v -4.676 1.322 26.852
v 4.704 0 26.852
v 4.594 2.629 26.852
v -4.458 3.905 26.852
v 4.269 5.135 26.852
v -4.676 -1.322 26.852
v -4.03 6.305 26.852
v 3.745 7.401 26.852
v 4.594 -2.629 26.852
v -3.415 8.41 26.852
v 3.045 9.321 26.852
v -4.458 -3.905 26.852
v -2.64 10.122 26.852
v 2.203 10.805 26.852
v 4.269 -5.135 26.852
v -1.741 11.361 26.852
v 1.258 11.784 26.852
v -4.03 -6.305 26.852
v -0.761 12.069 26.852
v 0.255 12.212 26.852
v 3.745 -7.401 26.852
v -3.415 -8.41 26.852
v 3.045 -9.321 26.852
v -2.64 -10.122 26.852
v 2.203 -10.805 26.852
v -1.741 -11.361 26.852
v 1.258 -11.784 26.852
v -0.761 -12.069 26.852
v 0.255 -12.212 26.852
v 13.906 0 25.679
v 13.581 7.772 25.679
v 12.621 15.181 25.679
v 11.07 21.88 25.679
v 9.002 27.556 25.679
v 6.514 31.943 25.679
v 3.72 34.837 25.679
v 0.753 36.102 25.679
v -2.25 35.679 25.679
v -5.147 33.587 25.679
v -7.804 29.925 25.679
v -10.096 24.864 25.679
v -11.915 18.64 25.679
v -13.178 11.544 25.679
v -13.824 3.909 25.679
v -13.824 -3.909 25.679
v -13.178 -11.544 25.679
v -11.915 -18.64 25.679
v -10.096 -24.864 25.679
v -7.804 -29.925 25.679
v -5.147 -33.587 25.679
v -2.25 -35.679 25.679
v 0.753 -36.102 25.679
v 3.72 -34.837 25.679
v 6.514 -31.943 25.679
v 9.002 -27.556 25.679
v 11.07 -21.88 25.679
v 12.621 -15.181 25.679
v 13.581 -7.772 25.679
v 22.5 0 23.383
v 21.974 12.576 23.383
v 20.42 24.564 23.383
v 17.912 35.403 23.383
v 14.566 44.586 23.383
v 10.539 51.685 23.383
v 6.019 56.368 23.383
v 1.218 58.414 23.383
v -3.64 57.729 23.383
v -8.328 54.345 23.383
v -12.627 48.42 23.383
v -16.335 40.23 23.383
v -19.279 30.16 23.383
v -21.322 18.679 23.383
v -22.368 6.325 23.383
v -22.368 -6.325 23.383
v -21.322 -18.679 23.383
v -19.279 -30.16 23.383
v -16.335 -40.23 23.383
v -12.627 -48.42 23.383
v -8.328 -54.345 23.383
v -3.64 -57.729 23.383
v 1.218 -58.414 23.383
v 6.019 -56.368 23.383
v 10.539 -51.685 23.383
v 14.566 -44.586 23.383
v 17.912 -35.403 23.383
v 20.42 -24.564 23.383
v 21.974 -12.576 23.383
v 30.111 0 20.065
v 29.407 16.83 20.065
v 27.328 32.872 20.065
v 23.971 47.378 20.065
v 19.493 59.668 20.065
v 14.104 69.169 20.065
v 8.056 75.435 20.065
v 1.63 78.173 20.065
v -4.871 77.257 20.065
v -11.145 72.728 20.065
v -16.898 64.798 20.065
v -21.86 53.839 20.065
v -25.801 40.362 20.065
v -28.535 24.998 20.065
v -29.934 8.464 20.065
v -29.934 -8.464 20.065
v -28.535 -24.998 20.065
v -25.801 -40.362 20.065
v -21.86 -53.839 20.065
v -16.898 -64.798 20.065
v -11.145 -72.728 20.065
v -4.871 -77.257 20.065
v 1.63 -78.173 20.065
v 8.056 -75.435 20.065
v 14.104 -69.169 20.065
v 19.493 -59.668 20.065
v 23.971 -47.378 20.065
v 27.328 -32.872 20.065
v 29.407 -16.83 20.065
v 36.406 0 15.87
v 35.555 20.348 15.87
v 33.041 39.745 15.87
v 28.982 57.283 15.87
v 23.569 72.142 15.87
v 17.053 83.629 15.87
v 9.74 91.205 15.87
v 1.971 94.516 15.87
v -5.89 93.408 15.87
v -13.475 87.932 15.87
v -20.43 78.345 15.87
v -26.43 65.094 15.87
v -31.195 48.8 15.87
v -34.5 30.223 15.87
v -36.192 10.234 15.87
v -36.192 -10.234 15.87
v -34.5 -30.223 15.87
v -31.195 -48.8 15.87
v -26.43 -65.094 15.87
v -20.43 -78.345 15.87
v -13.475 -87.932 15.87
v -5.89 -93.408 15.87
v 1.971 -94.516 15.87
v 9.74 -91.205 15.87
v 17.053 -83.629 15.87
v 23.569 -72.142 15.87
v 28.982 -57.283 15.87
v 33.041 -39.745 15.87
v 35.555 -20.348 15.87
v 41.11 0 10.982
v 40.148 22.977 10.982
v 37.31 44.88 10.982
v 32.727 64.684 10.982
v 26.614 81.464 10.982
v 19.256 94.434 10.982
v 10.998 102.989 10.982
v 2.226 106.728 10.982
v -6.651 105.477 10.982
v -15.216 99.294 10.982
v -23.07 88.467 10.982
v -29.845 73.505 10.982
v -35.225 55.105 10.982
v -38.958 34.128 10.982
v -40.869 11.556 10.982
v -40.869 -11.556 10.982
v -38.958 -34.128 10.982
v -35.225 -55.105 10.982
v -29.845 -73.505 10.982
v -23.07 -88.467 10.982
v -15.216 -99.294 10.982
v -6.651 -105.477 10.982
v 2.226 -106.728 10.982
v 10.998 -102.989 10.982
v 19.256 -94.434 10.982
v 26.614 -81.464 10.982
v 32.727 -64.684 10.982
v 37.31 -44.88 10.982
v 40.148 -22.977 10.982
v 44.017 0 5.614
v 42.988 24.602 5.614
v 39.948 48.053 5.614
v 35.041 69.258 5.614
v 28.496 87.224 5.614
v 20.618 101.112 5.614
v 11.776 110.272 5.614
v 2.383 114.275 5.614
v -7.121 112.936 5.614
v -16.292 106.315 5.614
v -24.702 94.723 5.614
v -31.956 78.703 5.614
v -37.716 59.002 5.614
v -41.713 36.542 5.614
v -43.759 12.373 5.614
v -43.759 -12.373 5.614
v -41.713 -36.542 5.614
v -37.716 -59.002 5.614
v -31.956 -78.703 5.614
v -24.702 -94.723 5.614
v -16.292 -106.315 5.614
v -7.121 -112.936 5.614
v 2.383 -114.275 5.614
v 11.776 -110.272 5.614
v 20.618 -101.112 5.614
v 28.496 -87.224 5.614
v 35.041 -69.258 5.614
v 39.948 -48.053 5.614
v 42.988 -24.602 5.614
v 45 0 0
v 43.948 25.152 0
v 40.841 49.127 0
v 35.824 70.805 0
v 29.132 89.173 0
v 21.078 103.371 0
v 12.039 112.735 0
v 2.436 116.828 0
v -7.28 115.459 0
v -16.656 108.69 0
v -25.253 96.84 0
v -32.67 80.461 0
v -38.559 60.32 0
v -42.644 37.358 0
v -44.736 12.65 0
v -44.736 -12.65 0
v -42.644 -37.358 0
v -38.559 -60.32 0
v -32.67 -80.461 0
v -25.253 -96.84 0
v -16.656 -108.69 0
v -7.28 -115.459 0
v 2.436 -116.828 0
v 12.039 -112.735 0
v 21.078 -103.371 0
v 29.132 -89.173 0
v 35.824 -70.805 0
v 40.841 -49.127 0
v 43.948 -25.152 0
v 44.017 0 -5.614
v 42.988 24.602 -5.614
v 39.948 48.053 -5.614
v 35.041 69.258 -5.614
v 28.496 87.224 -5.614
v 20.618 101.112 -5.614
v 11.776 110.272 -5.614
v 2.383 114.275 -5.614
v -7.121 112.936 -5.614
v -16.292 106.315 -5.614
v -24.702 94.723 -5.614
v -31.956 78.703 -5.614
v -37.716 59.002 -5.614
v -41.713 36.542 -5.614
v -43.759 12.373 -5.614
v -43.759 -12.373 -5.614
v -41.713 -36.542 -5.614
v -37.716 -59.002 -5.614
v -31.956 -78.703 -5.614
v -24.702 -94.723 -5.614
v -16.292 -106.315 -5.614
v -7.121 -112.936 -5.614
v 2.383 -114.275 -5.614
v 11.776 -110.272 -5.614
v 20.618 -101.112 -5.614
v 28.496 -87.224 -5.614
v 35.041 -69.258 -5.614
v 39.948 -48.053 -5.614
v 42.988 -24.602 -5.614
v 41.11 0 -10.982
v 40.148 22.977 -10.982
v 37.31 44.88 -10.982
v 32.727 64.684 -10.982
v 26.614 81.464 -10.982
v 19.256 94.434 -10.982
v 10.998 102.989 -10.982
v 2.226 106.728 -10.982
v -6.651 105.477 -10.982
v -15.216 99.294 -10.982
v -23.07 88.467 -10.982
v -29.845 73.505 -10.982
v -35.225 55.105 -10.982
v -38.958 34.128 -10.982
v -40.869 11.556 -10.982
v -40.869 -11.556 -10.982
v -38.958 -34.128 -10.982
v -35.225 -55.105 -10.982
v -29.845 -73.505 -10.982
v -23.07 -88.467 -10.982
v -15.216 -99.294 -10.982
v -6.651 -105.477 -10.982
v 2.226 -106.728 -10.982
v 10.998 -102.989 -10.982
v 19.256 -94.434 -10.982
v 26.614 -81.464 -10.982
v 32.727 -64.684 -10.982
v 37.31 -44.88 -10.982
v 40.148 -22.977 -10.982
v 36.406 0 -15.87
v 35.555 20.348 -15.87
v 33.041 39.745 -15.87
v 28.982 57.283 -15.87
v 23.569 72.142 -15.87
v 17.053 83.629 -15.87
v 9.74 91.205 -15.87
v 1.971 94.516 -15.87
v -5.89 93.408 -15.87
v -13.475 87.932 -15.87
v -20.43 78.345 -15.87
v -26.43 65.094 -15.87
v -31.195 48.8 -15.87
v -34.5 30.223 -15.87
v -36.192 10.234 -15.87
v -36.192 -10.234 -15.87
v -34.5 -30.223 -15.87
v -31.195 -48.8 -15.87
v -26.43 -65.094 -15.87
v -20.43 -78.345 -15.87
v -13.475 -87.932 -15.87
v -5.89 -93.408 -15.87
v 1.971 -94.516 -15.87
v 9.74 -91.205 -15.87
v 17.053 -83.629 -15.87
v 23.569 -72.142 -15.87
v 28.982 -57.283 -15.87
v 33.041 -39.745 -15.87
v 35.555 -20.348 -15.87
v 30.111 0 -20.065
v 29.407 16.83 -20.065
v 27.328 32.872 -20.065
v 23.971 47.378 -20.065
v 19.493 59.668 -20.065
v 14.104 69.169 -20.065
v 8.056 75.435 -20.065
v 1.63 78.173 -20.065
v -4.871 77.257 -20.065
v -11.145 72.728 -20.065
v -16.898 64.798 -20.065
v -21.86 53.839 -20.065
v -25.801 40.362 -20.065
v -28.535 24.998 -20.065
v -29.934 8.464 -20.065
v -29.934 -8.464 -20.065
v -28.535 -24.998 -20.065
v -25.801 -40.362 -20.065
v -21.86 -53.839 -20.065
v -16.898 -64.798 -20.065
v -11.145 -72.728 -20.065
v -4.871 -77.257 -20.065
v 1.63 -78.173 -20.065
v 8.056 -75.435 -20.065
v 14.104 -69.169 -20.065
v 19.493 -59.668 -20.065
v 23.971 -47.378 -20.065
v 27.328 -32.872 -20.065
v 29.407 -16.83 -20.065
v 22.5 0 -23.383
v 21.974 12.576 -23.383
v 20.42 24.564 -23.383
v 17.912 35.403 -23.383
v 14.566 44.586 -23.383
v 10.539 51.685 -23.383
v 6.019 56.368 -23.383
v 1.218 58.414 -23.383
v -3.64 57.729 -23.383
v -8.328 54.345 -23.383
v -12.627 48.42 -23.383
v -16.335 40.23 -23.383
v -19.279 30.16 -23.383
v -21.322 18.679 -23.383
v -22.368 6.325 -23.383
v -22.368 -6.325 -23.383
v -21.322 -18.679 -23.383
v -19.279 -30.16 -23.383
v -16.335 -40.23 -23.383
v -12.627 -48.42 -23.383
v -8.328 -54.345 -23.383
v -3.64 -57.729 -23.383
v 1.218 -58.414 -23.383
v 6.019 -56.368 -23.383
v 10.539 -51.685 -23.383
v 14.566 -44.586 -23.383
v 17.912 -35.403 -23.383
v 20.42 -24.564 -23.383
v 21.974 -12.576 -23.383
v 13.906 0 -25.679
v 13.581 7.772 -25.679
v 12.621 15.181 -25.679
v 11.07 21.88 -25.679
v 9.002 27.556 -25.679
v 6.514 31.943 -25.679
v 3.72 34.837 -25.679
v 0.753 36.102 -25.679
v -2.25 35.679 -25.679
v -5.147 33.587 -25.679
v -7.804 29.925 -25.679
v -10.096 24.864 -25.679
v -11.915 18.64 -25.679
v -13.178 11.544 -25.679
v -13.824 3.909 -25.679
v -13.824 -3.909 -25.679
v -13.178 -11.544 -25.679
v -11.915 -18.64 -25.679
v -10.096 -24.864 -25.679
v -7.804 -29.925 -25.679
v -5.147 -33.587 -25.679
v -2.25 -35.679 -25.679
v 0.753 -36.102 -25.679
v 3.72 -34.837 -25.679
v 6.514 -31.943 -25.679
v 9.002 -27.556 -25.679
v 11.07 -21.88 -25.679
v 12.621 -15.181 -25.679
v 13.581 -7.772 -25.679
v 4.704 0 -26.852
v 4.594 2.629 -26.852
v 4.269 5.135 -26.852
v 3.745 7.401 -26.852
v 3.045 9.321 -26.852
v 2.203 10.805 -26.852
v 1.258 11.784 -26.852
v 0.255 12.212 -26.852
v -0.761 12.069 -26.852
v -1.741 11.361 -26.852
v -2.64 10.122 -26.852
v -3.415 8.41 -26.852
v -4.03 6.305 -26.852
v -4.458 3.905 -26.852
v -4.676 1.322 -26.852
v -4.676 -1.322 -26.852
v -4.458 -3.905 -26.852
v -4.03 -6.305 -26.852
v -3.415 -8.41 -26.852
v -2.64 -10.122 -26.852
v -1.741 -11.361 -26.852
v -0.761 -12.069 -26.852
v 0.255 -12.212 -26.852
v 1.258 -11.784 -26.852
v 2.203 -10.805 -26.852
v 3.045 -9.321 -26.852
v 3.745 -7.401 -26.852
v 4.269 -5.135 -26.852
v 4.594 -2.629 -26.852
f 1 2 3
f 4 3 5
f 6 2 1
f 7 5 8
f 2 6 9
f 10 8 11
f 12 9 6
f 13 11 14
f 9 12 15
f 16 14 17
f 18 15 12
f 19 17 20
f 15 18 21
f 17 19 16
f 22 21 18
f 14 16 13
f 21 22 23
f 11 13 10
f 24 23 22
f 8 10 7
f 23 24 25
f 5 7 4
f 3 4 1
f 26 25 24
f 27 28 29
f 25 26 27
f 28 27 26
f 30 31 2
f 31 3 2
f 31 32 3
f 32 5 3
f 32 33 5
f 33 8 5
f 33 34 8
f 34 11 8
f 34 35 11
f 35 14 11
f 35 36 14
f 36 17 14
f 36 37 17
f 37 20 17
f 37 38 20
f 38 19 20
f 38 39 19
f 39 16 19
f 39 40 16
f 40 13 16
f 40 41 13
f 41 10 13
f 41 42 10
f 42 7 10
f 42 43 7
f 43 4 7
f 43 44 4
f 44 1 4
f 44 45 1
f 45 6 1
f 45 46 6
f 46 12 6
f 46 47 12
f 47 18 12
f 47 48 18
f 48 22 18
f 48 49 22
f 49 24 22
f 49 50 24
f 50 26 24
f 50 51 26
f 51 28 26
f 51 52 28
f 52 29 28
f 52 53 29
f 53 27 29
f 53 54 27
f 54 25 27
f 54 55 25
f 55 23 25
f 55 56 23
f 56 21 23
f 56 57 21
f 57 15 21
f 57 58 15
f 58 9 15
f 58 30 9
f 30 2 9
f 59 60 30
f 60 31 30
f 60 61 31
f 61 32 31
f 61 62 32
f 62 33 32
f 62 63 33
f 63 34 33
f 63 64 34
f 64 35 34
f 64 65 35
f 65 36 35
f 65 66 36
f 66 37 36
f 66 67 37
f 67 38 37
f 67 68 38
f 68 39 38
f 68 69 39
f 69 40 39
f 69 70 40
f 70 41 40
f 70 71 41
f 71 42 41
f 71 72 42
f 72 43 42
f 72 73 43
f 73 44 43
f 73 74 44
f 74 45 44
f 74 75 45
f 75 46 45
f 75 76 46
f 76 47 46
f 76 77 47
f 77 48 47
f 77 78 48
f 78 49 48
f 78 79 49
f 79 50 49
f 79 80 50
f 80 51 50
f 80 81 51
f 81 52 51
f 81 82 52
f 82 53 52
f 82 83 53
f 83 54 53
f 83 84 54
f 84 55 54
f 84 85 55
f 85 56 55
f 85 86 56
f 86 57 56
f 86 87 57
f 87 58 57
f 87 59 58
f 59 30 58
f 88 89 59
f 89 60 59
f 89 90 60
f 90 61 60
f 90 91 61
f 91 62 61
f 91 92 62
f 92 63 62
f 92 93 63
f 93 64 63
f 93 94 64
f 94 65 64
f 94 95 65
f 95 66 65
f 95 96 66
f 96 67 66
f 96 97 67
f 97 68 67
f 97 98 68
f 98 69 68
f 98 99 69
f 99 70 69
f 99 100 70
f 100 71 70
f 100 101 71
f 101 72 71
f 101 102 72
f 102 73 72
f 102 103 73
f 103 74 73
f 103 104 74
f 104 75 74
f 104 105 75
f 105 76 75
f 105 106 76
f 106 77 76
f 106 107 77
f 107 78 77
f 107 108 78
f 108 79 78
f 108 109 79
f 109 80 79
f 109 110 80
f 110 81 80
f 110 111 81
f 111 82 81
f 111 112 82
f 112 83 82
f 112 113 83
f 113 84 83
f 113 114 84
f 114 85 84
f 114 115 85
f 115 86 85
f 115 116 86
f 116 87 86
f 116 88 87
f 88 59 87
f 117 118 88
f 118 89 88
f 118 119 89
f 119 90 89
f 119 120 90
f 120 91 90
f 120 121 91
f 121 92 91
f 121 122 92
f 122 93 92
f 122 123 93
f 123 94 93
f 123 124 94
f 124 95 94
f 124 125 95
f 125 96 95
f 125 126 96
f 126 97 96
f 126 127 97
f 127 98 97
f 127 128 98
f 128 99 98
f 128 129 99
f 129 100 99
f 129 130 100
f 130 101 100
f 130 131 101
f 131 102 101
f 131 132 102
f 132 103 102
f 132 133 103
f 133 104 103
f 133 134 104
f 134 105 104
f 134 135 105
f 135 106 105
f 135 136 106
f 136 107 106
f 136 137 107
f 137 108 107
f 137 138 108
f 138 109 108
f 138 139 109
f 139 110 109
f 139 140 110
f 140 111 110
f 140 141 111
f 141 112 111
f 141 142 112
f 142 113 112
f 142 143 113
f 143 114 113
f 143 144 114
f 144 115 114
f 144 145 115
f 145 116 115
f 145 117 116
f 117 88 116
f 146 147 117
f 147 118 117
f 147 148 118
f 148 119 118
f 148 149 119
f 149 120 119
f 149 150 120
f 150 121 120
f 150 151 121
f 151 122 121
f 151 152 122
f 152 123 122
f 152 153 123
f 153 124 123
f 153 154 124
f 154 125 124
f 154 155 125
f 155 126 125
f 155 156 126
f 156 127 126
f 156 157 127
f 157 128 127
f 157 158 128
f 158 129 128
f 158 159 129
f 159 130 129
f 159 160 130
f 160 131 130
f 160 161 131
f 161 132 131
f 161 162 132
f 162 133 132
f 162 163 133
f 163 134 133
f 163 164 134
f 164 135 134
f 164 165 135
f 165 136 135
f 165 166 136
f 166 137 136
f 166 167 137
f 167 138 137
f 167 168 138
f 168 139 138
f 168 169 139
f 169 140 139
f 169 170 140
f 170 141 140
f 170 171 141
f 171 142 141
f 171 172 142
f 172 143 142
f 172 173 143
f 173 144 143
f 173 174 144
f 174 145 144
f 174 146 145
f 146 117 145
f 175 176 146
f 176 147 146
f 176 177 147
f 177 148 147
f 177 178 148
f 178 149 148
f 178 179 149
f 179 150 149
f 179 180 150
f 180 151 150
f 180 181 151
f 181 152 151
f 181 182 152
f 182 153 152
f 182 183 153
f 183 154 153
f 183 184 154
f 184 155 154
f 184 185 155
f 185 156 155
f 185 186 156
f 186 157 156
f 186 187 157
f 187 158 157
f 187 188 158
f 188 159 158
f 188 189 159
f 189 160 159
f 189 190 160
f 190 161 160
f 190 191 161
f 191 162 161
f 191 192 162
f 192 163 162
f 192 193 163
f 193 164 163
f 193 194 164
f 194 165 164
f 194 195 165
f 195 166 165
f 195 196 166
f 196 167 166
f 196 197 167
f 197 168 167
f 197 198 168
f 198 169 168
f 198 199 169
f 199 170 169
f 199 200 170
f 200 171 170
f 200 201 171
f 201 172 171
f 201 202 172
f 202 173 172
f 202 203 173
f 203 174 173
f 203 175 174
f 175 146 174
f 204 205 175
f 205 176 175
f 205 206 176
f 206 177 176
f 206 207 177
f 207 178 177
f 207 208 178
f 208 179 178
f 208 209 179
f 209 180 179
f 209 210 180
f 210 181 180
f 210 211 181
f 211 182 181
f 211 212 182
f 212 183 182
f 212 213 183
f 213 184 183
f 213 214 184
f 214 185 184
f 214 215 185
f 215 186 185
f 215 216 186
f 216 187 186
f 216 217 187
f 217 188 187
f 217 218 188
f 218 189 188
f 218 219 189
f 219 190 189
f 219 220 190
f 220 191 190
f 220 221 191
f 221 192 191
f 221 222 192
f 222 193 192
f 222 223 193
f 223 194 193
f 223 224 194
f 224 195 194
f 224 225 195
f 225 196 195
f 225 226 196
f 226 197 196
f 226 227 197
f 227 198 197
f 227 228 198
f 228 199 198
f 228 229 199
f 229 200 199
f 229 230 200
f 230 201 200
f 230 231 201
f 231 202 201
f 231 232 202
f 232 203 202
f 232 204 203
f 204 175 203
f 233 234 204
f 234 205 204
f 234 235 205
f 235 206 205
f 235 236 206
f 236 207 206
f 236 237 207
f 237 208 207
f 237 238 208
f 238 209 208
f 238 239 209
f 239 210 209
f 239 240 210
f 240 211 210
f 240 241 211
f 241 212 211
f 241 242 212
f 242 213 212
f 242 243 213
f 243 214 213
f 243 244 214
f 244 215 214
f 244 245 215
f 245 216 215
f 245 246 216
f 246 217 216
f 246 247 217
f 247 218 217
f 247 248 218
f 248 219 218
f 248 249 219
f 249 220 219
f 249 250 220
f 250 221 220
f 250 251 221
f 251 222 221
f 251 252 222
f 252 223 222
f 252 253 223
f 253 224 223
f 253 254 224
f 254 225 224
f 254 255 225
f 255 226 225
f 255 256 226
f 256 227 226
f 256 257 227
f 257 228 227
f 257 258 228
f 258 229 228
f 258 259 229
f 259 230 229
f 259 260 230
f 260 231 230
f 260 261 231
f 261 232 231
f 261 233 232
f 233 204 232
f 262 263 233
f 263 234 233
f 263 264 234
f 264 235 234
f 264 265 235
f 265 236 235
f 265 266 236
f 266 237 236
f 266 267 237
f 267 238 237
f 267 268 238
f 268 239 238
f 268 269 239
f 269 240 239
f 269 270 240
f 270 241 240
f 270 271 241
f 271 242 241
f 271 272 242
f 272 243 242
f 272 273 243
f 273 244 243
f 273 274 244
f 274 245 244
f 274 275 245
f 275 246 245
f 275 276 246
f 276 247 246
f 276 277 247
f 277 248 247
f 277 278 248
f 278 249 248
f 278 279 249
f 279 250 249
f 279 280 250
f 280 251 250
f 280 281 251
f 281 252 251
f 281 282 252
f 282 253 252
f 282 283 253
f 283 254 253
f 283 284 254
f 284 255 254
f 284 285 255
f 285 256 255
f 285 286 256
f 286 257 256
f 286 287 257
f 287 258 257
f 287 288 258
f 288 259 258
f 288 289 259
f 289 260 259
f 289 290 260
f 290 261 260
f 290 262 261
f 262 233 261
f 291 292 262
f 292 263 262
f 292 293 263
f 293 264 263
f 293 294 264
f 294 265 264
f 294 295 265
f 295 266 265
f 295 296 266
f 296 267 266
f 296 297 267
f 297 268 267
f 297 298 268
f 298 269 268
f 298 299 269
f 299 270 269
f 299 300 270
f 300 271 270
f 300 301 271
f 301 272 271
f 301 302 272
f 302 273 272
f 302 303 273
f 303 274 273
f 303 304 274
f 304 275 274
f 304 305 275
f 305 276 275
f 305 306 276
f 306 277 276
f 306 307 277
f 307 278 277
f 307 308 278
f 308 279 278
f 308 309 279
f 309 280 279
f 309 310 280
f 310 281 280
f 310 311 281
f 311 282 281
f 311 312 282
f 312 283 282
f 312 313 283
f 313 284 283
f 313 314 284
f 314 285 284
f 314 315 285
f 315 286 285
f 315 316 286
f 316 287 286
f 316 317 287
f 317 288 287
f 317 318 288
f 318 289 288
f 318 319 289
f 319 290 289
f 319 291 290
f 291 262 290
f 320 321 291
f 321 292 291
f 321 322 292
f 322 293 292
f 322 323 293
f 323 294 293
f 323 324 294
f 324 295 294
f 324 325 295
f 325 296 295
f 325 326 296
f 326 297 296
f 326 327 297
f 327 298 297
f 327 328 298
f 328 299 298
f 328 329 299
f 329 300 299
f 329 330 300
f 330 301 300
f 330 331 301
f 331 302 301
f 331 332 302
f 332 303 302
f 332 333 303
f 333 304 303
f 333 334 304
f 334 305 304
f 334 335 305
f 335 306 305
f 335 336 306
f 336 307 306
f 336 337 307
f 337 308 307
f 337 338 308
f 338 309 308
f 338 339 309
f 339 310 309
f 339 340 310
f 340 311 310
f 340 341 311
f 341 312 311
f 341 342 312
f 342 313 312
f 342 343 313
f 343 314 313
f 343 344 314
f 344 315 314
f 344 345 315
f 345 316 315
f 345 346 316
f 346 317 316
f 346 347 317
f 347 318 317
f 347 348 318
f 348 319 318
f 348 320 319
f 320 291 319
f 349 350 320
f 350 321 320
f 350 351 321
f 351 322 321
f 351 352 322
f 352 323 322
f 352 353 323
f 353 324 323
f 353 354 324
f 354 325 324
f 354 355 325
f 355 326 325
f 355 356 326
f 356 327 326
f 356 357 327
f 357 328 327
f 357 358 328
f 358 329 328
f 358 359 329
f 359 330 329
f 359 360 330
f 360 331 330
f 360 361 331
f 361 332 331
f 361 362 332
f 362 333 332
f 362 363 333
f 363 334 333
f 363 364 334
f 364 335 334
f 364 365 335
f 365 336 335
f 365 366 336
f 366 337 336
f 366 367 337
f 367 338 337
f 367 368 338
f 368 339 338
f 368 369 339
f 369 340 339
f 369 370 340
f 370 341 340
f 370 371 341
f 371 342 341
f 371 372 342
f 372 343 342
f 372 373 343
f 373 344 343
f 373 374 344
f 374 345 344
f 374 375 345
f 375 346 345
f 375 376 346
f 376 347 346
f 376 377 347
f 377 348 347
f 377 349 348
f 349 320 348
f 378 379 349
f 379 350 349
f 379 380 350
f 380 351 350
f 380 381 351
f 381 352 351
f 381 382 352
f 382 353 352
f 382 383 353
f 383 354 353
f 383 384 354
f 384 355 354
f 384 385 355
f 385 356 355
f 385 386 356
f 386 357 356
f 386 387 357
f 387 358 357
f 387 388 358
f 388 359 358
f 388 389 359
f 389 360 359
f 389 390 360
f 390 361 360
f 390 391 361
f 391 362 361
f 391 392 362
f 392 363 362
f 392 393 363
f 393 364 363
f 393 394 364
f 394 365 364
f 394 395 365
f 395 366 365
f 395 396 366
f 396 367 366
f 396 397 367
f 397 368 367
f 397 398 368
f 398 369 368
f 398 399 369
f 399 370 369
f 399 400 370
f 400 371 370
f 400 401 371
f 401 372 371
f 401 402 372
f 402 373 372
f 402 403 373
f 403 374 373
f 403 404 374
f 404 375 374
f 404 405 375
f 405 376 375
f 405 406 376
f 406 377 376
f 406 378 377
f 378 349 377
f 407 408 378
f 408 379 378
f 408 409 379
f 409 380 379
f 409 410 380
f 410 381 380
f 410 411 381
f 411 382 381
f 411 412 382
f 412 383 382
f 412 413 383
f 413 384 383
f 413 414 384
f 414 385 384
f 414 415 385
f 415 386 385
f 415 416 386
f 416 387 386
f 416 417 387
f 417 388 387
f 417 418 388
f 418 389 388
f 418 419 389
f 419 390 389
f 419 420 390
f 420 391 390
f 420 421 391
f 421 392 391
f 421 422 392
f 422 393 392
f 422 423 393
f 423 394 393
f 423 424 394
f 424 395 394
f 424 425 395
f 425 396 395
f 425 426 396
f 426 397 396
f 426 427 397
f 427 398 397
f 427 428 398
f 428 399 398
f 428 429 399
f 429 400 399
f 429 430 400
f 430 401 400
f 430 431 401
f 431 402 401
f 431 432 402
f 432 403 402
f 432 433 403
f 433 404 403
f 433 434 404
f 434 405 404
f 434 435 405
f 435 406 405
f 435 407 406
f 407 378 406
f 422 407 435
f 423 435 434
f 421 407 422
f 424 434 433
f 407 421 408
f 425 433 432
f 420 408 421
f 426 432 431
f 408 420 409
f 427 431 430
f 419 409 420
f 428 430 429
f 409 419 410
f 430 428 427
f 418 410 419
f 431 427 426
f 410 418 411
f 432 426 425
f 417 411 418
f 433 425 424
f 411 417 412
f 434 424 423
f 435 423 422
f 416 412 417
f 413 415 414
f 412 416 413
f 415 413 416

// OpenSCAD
// Generated by SolidPython 1.0.1 on 2020-07-29 00:46:46


scale(v = [5, 13, 3]) {
	sphere(r = 9);
}
/***********************************************
*********      SolidPython code:      **********
************************************************
 
# import packages: SolidPython
from solid import *
from solid.utils import *
from itertools import chain, combinations, permutations


class Resize:

    def __init__(self, scad_file):
        self.scad_file = scad_file
        #self.scad_file = import_scad(scad_file)
        # cone/cylinder param:
        self.r1 = 0
        self.r2 = 0
        self.h = 0
        # rectangular prism param:
        self.w = 0
        self.l = 0
        # ellipse param:
        self.r = 0

    # import OpenScad code (file name corresponds to shape)


    # classify shape + parameters
    def assign(self, param1, param2, param3):
        if self.scad_file == 'cone.scad':
            self.r1 = param1
            self.r2 = param2
            self.h = param3
        elif self.scad_file == 'cylinder.scad':
            self.r1 = param1
            self.r2 = param2
            self.h = param3
        elif self.scad_file == 'rectangularPrism.scad':
            self.h = param1
            self.l = param2
            self.w = param3
        else:
            self.r = param1
            self.h = param2

    # resize parameters
    def iterate(self):
        x = range(3, 20, 2)
        i = 1
        if self.scad_file == 'cone.scad':
            tempList = list(permutations(x, 2))
            for temp in tempList:
                param1 = temp[0]
                param2 = temp[1]
                filepath = 'produced_scad_files/' + 'cone' + str(param1) + '_' + str(param2) + '_' + '.scad'
                scad_render_to_file(cylinder(h=param1, r1=param2, r2=0), filepath)

        elif self.scad_file == 'cylinder.scad':
            tempList = list(permutations(x, 3))
            for temp in tempList:
                param1 = temp[0]
                param2 = temp[1]
                filepath = 'produced_scad_files/' + 'cylinder' + str(param1) + '_' + str(param2) + '_' + '.scad'
                scad_render_to_file(cylinder(h=param1, r1=param2, r2=param2), filepath)

        elif self.scad_file == 'rectangularPrism.scad':
            tempList = list(permutations(x, 3))
            for temp in tempList:
                param1 = temp[0]
                param2 = temp[1]
                param3 = temp[2]
                filepath = 'produced_scad_files/' + 'rectangularPrism' + str(param1) + '_' + str(param2) + '_' + str(
                    param3) + '.scad'
                scad_render_to_file(cube(size=(param1, param2, param3)), filepath)

        elif self.scad_file == 'ellipse.scad':
            tempList = list(permutations(x, 4))
            for temp in tempList:
                param1 = temp[0]
                param2 = temp[1]
                param3 = temp[2]
                param4 = temp[3]
                filepath = 'produced_scad_files/' + 'ellipse' + str(param1) + '_' + str(param2) + '_' + str(param3) + '_' + str(param4) + '.scad'
                scad_render_to_file(scale([param1, param2, param3])(sphere(r=param4)), filepath)

    def render_to_scadfile(self):
        scad_render_to_file(scad, 'example.scad') 
 
************************************************/
